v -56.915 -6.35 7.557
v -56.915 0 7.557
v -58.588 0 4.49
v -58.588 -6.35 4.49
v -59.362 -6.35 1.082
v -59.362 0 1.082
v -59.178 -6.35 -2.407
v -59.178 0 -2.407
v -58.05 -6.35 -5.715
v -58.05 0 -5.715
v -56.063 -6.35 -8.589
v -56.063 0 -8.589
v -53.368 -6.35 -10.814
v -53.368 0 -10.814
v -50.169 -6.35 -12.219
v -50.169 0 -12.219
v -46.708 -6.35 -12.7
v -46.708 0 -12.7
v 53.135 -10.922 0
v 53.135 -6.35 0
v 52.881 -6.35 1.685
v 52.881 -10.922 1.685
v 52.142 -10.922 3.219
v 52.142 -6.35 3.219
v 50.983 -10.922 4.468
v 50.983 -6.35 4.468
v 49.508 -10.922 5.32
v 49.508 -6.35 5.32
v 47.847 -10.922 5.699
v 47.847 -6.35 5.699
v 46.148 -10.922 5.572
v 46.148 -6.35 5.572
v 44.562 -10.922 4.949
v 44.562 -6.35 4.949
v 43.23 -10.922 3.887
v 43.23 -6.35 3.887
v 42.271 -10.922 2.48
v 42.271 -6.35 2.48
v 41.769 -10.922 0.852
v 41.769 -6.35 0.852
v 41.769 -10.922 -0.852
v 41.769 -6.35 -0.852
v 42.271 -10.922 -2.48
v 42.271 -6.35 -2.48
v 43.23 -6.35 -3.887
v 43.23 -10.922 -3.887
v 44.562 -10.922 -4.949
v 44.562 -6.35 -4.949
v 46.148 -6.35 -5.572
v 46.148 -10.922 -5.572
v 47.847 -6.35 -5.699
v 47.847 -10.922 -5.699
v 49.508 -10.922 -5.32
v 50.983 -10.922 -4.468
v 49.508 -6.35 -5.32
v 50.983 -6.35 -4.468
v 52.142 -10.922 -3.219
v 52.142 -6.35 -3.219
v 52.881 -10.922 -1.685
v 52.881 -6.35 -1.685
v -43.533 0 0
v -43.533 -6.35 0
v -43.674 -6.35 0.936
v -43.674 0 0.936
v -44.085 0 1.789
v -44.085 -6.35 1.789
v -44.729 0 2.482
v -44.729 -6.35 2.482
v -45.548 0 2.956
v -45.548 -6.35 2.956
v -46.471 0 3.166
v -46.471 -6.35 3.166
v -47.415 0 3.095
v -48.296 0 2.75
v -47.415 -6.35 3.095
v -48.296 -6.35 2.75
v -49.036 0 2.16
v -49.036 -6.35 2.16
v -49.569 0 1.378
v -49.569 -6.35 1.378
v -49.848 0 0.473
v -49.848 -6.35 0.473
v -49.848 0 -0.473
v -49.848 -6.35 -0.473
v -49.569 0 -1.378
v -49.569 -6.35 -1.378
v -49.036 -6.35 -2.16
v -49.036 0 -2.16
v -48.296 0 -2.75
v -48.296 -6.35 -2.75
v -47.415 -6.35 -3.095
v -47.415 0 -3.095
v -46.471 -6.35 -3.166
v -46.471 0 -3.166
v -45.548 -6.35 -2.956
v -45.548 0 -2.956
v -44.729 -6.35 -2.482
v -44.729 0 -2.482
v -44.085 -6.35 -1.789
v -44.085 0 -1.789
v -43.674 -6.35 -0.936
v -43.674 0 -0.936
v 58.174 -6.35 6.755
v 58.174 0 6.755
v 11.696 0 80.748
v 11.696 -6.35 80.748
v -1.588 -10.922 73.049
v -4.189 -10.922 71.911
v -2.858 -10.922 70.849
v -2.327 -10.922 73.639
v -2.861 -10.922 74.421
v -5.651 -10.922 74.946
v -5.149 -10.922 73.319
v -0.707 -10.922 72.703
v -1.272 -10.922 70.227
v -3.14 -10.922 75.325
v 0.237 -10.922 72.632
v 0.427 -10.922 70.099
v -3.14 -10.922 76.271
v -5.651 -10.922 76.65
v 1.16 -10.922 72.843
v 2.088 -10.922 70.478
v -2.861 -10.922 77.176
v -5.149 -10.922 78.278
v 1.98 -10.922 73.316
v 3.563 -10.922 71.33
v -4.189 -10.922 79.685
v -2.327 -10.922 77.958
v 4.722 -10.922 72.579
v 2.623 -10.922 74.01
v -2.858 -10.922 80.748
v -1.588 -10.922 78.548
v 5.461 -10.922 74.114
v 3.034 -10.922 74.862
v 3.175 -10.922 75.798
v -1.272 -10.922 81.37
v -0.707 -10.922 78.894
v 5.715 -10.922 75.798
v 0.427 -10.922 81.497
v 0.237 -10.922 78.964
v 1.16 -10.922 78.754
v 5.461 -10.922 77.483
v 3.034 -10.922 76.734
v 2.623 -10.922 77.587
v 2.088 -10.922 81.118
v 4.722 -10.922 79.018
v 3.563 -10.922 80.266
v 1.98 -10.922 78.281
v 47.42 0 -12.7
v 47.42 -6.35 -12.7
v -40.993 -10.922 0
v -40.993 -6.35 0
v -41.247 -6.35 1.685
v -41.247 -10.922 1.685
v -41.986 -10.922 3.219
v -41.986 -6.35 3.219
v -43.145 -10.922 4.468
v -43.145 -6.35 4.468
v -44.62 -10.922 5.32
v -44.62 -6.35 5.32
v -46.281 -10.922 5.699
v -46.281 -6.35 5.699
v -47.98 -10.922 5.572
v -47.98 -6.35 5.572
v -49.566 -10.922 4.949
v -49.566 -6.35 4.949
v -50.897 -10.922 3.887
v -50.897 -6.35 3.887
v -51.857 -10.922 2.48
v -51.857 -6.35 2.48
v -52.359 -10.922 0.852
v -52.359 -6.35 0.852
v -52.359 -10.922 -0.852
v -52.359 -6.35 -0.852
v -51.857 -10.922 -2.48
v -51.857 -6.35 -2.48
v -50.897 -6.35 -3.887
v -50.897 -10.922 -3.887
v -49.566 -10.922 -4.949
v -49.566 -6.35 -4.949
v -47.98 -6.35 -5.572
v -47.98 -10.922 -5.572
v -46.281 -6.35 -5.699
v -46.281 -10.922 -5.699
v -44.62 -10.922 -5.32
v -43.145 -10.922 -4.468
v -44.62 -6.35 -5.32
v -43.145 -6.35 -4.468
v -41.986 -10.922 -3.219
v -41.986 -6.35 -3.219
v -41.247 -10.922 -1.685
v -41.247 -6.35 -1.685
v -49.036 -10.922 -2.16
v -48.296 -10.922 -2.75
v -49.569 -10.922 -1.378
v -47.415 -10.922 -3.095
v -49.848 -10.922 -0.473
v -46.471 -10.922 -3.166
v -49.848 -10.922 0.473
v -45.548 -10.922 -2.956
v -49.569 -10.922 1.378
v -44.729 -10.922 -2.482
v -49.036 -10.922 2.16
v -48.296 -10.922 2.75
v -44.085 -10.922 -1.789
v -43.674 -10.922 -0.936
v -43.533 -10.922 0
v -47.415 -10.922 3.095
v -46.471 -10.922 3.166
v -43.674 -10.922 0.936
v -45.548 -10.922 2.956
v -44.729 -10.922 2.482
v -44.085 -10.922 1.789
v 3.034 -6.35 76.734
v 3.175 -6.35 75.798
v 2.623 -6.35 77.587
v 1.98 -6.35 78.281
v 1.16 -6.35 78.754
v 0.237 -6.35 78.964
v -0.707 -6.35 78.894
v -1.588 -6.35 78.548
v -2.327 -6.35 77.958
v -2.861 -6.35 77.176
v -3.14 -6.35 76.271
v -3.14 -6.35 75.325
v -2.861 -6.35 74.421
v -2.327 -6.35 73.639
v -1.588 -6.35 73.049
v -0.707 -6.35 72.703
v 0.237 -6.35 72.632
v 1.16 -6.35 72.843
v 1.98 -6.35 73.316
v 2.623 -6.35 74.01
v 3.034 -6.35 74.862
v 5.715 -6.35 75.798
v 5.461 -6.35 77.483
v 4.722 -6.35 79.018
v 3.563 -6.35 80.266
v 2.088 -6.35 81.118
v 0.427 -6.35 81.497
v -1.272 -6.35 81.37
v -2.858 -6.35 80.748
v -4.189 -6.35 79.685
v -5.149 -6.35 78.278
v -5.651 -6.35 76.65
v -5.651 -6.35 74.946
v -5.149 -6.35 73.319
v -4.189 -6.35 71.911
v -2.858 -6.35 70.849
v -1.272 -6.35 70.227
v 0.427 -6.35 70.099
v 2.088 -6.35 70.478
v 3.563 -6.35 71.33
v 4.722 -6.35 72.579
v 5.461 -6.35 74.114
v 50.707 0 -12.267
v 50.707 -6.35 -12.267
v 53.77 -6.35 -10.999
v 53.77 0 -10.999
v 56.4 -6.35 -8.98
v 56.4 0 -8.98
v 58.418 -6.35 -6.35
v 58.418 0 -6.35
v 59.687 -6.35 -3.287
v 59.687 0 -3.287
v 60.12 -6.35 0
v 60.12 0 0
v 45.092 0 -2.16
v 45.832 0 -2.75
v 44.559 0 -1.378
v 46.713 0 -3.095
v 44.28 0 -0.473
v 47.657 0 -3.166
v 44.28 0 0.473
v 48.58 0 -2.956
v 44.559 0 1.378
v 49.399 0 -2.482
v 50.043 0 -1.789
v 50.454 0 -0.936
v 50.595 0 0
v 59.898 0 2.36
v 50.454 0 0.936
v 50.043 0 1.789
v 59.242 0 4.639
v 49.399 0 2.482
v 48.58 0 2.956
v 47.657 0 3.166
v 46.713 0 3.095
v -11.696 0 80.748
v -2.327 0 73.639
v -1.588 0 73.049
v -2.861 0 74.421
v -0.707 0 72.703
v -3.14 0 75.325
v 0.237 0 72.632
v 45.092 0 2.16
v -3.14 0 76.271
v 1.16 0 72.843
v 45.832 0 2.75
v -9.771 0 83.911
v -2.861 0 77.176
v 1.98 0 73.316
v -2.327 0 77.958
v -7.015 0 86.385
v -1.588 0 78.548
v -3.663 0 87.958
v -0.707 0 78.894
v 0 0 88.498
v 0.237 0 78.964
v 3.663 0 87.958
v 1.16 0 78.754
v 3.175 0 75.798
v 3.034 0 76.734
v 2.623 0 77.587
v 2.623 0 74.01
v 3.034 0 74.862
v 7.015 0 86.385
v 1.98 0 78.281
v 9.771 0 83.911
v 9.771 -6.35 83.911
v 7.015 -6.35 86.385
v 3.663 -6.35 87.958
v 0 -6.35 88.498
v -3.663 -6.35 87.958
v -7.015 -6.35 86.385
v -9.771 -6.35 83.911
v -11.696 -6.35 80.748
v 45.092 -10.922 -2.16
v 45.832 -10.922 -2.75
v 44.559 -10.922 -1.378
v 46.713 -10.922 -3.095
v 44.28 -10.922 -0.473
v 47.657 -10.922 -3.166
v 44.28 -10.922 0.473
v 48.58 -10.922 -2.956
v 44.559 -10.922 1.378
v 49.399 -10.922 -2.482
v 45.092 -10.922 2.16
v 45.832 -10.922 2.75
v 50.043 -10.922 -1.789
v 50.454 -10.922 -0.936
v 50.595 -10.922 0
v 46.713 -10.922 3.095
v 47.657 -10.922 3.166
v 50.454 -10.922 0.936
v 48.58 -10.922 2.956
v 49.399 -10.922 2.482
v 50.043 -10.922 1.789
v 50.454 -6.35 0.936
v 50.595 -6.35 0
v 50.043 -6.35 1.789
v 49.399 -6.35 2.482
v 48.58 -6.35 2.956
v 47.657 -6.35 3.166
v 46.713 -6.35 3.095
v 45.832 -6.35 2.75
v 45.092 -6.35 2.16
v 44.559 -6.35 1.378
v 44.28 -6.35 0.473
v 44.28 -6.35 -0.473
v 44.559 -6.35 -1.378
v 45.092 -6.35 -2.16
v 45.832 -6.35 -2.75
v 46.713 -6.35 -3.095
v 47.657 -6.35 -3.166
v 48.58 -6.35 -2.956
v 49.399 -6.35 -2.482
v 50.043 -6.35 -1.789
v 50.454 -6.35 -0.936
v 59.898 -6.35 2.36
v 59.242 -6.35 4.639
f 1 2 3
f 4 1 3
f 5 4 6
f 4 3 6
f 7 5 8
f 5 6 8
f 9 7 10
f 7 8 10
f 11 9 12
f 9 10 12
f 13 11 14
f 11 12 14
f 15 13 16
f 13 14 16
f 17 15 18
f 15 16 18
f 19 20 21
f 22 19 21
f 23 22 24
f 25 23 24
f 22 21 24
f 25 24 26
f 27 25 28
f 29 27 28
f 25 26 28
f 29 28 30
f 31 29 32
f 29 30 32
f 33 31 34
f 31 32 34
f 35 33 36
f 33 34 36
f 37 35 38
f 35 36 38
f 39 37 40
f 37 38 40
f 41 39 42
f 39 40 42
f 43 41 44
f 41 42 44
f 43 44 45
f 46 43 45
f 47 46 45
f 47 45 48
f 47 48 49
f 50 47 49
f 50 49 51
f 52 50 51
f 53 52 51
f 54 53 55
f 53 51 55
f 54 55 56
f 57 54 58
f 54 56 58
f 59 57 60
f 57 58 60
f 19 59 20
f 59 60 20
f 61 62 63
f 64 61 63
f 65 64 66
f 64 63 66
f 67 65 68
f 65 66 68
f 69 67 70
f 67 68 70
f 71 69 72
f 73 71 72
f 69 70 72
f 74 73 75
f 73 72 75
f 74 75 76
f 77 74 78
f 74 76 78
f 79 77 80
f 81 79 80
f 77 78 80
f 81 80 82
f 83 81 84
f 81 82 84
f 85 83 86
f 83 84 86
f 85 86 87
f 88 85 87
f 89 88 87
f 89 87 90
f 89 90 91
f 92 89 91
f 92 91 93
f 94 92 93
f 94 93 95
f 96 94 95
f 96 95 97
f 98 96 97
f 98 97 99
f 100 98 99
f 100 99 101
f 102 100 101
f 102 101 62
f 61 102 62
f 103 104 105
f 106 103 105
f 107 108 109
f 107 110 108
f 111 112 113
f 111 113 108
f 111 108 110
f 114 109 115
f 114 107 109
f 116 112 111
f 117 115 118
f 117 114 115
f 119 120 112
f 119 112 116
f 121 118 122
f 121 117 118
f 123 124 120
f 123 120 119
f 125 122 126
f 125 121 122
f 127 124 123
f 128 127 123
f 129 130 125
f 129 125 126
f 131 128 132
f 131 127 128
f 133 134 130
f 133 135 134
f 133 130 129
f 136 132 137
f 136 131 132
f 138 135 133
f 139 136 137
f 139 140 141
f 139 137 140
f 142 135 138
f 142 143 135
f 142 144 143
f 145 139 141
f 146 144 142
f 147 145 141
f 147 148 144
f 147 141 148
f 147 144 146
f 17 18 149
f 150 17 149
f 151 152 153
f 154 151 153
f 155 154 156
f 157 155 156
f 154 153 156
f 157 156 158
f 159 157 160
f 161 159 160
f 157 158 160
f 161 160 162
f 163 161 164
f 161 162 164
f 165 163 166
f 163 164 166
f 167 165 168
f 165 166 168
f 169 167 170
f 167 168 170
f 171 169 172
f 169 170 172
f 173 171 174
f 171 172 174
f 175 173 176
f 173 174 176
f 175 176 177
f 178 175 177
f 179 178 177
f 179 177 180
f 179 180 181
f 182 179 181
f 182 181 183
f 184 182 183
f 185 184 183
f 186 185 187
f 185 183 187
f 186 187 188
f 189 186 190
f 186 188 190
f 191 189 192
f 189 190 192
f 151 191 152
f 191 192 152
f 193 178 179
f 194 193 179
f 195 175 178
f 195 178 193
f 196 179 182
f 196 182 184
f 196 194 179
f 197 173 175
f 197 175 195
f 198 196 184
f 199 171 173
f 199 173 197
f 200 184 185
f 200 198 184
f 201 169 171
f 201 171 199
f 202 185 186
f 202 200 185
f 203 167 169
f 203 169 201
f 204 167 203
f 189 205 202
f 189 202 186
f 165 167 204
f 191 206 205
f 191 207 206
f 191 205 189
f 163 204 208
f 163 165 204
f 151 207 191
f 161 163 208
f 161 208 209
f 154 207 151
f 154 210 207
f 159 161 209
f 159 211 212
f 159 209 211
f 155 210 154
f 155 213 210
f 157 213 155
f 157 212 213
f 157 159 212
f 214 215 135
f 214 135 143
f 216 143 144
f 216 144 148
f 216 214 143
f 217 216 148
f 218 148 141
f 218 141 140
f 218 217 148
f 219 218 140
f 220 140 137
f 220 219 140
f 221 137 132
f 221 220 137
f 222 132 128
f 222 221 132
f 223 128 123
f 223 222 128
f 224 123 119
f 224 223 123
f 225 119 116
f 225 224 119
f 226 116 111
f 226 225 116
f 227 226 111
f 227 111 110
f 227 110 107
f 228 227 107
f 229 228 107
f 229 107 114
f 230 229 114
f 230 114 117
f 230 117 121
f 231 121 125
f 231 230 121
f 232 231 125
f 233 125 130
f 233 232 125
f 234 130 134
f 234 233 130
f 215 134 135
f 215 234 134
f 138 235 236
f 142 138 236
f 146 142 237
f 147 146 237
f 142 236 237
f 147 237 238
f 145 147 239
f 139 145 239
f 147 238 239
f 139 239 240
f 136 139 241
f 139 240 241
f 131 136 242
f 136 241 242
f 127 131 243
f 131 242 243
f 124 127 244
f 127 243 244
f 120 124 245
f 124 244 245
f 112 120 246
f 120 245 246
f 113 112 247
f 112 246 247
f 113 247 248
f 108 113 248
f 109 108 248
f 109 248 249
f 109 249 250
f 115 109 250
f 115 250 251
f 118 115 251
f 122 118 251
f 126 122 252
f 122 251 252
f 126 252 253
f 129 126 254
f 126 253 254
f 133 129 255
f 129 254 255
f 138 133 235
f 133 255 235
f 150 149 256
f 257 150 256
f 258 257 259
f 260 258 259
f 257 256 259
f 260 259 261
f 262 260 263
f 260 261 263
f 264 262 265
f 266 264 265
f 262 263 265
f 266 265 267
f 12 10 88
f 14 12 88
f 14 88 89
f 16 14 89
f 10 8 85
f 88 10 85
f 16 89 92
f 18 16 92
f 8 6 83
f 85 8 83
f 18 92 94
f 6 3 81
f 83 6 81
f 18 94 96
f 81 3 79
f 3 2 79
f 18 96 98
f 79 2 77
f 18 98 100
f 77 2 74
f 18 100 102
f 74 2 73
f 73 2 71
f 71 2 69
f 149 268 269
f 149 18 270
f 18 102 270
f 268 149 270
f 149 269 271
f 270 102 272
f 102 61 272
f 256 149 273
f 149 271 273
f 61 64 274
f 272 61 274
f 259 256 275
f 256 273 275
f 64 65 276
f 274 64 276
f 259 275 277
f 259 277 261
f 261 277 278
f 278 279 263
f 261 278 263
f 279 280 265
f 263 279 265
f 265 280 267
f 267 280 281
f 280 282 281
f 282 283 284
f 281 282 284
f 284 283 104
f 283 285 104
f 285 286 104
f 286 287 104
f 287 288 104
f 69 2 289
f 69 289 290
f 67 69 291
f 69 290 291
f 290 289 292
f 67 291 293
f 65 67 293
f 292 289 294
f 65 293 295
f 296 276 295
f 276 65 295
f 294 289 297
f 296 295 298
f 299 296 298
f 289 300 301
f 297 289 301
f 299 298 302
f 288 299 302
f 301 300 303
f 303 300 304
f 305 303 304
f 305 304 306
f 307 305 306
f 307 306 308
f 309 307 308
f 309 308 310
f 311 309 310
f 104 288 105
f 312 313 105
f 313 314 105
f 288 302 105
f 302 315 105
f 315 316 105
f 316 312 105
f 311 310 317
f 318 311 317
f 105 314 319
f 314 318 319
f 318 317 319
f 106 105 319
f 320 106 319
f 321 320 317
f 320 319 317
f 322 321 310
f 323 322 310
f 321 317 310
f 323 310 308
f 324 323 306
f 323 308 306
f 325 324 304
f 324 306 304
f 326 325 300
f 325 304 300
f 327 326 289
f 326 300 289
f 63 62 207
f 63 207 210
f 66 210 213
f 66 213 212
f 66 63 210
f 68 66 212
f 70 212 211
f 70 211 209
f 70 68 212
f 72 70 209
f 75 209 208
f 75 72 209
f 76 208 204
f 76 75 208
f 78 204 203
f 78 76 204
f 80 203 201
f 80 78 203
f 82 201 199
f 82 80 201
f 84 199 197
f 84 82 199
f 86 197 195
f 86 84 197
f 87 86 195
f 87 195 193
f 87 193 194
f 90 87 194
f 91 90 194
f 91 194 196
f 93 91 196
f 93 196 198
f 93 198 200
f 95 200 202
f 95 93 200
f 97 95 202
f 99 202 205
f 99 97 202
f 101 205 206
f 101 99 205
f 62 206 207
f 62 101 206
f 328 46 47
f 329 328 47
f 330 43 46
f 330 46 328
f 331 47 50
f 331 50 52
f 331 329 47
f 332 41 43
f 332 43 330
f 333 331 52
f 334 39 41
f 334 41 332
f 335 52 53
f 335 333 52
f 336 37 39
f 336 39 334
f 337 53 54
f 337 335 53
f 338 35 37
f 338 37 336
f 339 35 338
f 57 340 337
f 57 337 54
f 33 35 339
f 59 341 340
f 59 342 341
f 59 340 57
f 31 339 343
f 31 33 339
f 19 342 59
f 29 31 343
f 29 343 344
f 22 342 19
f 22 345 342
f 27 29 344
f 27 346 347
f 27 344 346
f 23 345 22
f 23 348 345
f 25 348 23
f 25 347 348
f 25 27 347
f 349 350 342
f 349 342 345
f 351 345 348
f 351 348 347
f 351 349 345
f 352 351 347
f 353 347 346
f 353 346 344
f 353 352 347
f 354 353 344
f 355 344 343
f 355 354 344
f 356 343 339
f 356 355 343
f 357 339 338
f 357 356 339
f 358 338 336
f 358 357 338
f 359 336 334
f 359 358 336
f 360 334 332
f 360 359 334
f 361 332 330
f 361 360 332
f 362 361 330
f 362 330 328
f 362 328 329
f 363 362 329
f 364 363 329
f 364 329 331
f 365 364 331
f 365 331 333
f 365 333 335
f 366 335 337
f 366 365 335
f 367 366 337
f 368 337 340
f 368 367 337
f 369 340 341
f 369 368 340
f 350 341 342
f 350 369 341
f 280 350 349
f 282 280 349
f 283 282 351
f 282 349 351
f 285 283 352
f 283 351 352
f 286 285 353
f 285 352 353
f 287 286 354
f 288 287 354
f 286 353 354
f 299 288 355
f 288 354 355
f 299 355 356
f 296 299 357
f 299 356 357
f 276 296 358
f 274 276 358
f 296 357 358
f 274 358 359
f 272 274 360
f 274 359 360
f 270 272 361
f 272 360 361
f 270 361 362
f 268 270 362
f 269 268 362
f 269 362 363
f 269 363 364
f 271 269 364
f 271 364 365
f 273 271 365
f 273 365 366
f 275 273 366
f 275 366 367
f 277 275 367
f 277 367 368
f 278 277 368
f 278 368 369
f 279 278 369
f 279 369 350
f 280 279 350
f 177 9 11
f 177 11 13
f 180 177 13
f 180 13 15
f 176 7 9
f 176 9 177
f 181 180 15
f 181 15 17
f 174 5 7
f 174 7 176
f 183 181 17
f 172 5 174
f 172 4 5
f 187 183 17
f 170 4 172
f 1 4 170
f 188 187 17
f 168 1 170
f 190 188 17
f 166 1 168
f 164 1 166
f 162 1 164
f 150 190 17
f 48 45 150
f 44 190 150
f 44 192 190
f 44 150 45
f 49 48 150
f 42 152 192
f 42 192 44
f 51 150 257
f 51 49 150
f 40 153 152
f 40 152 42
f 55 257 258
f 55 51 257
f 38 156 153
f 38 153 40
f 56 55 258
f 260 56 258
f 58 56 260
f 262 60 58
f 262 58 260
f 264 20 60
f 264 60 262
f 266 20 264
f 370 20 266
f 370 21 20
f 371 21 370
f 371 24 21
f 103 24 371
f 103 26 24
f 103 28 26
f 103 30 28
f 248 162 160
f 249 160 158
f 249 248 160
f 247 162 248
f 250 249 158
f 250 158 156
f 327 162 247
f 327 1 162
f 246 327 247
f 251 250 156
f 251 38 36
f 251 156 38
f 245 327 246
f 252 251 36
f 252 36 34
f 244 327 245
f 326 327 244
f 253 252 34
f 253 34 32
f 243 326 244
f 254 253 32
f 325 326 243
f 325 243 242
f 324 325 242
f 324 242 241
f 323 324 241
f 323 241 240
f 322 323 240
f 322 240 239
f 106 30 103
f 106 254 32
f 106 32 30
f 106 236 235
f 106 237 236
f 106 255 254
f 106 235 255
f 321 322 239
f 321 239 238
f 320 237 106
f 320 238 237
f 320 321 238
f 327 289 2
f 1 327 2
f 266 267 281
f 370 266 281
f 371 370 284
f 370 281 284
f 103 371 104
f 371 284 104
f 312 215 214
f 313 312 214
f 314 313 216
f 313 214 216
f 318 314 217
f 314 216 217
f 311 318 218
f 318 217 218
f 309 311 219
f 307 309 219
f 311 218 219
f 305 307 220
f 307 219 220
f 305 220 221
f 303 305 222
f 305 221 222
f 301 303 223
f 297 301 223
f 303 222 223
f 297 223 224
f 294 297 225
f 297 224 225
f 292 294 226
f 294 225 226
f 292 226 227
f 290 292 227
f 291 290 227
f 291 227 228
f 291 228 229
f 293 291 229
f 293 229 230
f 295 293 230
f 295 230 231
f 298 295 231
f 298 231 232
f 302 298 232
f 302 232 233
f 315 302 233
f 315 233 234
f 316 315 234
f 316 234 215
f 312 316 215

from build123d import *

# Parameters (mm, degrees)
F1_DEPTH = 6.35
F2_R     = 3.175
F3_DEPTH = 25.4
F2_R_2   = 5.715
F4_DEPTH = 4.572


with BuildPart() as f1:
    # F0 (on Front) → F1 (new body)
    with BuildSketch(Plane.XZ):
        with BuildLine():
            ThreePointArc((-11.6955887006, 80.7483033067), (-2.5254725798, 63.3518676414), (12.7, 75.7982321005))
            ThreePointArc((12.7, 75.7982321005), (12.4463644591, 78.3237046803), (11.6955887006, 80.7483033067))
            ThreePointArc((11.6955887006, 80.7483033067), (0, 88.4982321005), (-11.6955887006, 80.7483033067))
        make_face()
        with BuildLine():
            ThreePointArc((11.6955887006, 80.7483033067), (12.4463644591, 78.3237046803), (12.7, 75.7982321005))
            ThreePointArc((12.7, 75.7982321005), (-2.5254725798, 63.3518676414), (-11.6955887006, 80.7483033067))
            Line((-11.6955887006, 80.7483033067), (-56.9148214828, 7.5573103616))
            ThreePointArc((-56.9148214828, 7.5573103616), (-42.7291164055, 12.06058246), (-34.0081050618, 0))
            ThreePointArc((-34.0081050618, 0), (-37.7278489407, -8.9802561211), (-46.7081050618, -12.7))
            Line((-46.7081050618, -12.7), (47.4196799213, -12.7))
            ThreePointArc((47.4196799213, -12.7), (36.3047725839, 6.1440080469), (58.1740232476, 6.7553015936))
            Line((58.1740232476, 6.7553015936), (11.6955887006, 80.7483033067))
        make_face()
        with BuildLine():
            Line((47.4196799213, -12.7), (58.1740232476, 6.7553015936))
            ThreePointArc((58.1740232476, 6.7553015936), (36.3047725839, 6.1440080469), (47.4196799213, -12.7))
        make_face()
        with BuildLine():
            ThreePointArc((60.1196799213, 0), (59.6235760255, 3.5149565969), (58.1740232476, 6.7553015936))
            Line((58.1740232476, 6.7553015936), (47.4196799213, -12.7))
            ThreePointArc((47.4196799213, -12.7), (56.3999360424, -8.9802561211), (60.1196799213, 0))
        make_face()
        with BuildLine():
            Line((-46.7081050618, -12.7), (-56.9148214828, 7.5573103616))
            ThreePointArc((-56.9148214828, 7.5573103616), (-58.0497945654, -5.7145497814), (-46.7081050618, -12.7))
        make_face()
        with BuildLine():
            ThreePointArc((-34.0081050618, 0), (-42.7291164055, 12.06058246), (-56.9148214828, 7.5573103616))
            Line((-56.9148214828, 7.5573103616), (-46.7081050618, -12.7))
            ThreePointArc((-46.7081050618, -12.7), (-37.7278489407, -8.9802561211), (-34.0081050618, 0))
        make_face()
    extrude(amount=F1_DEPTH)

    # F2 (on face) → F3 (cut)
    with BuildSketch(Plane.XZ.offset(6.35)):
        with Locations((-46.7081050618, 0)):
            Circle(F2_R)
        with Locations((47.4196799213, 0)):
            Circle(F2_R)
        with Locations((0, 75.7982321005)):
            Circle(F2_R)
    extrude(amount=-F3_DEPTH, mode=Mode.SUBTRACT)

    # F2 (on face) → F4 (join)
    with BuildSketch(Plane.XZ.offset(6.35)):
        with Locations((47.4196799213, 0)):
            Circle(F2_R_2)
        with Locations((47.4196799213, 0)):
            Circle(F2_R, mode=Mode.SUBTRACT)
        with Locations((-46.7081050618, 0)):
            Circle(F2_R_2)
        with Locations((-46.7081050618, 0)):
            Circle(F2_R, mode=Mode.SUBTRACT)
        with Locations((0, 75.7982321005)):
            Circle(F2_R_2)
        with Locations((0, 75.7982321005)):
            Circle(F2_R, mode=Mode.SUBTRACT)
    extrude(amount=F4_DEPTH)


solid = f1.part
